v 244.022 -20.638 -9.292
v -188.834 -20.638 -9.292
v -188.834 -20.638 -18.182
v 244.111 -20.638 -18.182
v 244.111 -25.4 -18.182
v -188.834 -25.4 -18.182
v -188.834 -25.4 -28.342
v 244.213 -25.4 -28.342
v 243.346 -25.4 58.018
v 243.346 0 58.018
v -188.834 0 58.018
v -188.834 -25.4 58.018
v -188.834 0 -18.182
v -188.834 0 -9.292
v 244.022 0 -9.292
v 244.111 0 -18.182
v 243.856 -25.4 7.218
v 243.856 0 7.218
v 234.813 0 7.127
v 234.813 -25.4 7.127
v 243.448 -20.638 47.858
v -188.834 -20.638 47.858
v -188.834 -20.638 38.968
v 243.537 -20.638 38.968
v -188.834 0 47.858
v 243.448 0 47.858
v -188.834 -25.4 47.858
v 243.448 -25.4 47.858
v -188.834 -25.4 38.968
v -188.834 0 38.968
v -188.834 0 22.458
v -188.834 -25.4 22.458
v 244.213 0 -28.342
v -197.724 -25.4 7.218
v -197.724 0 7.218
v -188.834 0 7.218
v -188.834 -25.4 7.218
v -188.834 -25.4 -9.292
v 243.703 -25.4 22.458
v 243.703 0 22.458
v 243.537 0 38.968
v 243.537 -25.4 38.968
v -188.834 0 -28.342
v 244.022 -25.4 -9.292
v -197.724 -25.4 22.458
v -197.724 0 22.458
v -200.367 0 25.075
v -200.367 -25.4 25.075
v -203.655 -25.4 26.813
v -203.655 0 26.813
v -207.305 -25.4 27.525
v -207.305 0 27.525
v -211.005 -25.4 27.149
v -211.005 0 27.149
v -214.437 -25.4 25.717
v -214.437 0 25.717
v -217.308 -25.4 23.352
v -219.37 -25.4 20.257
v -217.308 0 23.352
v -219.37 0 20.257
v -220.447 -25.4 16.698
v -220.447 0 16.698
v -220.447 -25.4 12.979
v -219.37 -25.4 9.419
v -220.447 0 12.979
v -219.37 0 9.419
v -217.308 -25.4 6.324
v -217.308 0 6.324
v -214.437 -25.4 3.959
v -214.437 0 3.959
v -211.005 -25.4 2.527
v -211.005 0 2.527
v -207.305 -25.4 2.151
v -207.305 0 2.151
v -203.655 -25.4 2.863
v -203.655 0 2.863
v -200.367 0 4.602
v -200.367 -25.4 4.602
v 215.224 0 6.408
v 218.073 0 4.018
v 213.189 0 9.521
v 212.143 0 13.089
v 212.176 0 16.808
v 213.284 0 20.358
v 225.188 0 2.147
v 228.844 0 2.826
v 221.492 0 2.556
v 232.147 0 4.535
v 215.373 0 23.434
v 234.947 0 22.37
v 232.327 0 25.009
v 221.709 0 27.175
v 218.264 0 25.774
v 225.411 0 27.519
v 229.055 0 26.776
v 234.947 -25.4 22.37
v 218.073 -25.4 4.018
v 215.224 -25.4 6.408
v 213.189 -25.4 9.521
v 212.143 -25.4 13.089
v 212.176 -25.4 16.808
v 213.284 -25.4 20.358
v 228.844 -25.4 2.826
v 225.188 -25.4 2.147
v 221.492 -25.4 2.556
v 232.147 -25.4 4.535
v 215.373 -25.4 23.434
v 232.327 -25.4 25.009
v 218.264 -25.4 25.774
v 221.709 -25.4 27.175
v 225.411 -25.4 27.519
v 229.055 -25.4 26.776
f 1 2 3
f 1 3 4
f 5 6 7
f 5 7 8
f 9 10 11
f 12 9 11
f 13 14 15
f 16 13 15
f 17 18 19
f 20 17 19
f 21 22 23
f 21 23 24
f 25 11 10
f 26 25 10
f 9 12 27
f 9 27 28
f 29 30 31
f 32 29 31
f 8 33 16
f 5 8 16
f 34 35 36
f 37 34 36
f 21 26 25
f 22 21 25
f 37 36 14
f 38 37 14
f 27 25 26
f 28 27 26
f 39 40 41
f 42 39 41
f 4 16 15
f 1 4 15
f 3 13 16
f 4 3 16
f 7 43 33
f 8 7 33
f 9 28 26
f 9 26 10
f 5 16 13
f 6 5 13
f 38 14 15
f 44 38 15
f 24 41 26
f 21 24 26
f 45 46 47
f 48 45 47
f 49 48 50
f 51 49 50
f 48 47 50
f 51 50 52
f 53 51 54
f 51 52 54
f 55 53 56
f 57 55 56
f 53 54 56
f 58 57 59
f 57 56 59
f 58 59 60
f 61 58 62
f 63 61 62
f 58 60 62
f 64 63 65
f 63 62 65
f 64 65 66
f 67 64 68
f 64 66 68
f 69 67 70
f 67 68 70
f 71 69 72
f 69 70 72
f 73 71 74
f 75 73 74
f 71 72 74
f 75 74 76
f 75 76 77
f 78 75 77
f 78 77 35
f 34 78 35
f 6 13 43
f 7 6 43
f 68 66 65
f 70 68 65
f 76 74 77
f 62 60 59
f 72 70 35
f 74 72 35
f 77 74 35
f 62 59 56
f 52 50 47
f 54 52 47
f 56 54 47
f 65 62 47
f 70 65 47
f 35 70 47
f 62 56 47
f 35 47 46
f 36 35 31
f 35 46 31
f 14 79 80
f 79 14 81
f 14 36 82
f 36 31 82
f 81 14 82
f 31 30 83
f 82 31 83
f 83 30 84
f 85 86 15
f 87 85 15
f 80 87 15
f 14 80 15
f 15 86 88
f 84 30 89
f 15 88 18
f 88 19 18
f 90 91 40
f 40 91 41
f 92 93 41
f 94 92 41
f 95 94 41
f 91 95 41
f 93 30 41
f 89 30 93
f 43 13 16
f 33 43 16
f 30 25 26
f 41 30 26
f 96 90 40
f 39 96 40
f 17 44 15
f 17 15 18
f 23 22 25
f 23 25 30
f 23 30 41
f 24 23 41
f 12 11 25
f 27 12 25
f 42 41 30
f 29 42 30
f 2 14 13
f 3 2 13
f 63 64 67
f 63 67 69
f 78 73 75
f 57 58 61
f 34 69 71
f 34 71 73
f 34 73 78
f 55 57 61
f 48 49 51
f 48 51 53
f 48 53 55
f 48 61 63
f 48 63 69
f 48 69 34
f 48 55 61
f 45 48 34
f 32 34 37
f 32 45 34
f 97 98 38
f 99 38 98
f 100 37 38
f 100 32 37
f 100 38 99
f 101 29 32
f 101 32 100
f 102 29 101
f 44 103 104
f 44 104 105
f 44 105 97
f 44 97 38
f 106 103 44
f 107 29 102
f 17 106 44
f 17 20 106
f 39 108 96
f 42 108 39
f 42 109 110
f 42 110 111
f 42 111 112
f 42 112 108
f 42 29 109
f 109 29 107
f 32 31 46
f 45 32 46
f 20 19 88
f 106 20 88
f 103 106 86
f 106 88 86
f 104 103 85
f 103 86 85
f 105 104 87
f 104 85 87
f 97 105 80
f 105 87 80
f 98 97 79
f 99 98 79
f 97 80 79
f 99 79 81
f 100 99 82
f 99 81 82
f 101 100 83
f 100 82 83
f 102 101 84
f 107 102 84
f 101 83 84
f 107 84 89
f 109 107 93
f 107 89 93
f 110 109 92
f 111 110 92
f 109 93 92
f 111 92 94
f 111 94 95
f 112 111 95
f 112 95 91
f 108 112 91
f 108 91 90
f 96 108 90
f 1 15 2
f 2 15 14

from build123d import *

# Parameters (mm, degrees)
F1_DEPTH = 25.4
F2_DEPTH = 20.6375


with BuildPart() as f1:
    # F0 (on Front) → F1 (new body)
    with BuildSketch(Plane.XZ):
        with BuildLine():
            Line((243.536931, 38.968073), (-188.834176, 38.968073))
            Line((-188.834176, 38.968073), (-188.834176, 22.458073))
            Line((-188.834176, 22.458073), (-188.834176, 7.218073))
            Line((-188.834176, 7.218073), (-188.834176, -9.291927))
            Line((-188.834176, -9.291927), (244.021843, -9.291927))
            Line((244.021843, -9.291927), (243.855952, 7.218073))
            Line((243.855952, 7.218073), (234.813271, 7.127213))
            ThreePointArc((234.813271, 7.127213), (212.022547, 14.949858), (234.947443, 22.370099))
            Line((234.947443, 22.370099), (243.702822, 22.458073))
            Line((243.702822, 22.458073), (243.536931, 38.968073))
        make_face()
        Polygon((244.111169, -18.181927), (-188.834176, -18.181927), (-188.834176, -28.341927), (244.213256, -28.341927), align=None)
        with BuildLine():
            ThreePointArc((-195.184176, 14.838073), (-195.835898, 18.854165), (-197.724176, 22.458073))
            ThreePointArc((-197.724176, 22.458073), (-220.584176, 14.838073), (-197.724176, 7.218073))
            ThreePointArc((-197.724176, 7.218073), (-195.835898, 10.82198), (-195.184176, 14.838073))
        make_face()
        with BuildLine():
            Line((-188.834176, 7.218073), (-188.834176, 22.458073))
            Line((-188.834176, 22.458073), (-197.724176, 22.458073))
            ThreePointArc((-197.724176, 22.458073), (-195.835898, 18.854165), (-195.184176, 14.838073))
            ThreePointArc((-195.184176, 14.838073), (-195.835898, 10.82198), (-197.724176, 7.218073))
            Line((-197.724176, 7.218073), (-188.834176, 7.218073))
        make_face()
        Polygon((243.345518, 58.018073), (-188.834176, 58.018073), (-188.834176, 47.858073), (243.447605, 47.858073), align=None)
    extrude(amount=F1_DEPTH)


with BuildPart() as f2:
    # F0 (on Front) → F2 (new body)
    with BuildSketch(Plane.XZ):
        Polygon((243.447605, 47.858073), (-188.834176, 47.858073), (-188.834176, 38.968073), (243.536931, 38.968073), align=None)
        Polygon((244.021843, -9.291927), (-188.834176, -9.291927), (-188.834176, -18.181927), (244.111169, -18.181927), align=None)
    extrude(amount=F2_DEPTH)


solid = Compound([f1.part, f2.part])
